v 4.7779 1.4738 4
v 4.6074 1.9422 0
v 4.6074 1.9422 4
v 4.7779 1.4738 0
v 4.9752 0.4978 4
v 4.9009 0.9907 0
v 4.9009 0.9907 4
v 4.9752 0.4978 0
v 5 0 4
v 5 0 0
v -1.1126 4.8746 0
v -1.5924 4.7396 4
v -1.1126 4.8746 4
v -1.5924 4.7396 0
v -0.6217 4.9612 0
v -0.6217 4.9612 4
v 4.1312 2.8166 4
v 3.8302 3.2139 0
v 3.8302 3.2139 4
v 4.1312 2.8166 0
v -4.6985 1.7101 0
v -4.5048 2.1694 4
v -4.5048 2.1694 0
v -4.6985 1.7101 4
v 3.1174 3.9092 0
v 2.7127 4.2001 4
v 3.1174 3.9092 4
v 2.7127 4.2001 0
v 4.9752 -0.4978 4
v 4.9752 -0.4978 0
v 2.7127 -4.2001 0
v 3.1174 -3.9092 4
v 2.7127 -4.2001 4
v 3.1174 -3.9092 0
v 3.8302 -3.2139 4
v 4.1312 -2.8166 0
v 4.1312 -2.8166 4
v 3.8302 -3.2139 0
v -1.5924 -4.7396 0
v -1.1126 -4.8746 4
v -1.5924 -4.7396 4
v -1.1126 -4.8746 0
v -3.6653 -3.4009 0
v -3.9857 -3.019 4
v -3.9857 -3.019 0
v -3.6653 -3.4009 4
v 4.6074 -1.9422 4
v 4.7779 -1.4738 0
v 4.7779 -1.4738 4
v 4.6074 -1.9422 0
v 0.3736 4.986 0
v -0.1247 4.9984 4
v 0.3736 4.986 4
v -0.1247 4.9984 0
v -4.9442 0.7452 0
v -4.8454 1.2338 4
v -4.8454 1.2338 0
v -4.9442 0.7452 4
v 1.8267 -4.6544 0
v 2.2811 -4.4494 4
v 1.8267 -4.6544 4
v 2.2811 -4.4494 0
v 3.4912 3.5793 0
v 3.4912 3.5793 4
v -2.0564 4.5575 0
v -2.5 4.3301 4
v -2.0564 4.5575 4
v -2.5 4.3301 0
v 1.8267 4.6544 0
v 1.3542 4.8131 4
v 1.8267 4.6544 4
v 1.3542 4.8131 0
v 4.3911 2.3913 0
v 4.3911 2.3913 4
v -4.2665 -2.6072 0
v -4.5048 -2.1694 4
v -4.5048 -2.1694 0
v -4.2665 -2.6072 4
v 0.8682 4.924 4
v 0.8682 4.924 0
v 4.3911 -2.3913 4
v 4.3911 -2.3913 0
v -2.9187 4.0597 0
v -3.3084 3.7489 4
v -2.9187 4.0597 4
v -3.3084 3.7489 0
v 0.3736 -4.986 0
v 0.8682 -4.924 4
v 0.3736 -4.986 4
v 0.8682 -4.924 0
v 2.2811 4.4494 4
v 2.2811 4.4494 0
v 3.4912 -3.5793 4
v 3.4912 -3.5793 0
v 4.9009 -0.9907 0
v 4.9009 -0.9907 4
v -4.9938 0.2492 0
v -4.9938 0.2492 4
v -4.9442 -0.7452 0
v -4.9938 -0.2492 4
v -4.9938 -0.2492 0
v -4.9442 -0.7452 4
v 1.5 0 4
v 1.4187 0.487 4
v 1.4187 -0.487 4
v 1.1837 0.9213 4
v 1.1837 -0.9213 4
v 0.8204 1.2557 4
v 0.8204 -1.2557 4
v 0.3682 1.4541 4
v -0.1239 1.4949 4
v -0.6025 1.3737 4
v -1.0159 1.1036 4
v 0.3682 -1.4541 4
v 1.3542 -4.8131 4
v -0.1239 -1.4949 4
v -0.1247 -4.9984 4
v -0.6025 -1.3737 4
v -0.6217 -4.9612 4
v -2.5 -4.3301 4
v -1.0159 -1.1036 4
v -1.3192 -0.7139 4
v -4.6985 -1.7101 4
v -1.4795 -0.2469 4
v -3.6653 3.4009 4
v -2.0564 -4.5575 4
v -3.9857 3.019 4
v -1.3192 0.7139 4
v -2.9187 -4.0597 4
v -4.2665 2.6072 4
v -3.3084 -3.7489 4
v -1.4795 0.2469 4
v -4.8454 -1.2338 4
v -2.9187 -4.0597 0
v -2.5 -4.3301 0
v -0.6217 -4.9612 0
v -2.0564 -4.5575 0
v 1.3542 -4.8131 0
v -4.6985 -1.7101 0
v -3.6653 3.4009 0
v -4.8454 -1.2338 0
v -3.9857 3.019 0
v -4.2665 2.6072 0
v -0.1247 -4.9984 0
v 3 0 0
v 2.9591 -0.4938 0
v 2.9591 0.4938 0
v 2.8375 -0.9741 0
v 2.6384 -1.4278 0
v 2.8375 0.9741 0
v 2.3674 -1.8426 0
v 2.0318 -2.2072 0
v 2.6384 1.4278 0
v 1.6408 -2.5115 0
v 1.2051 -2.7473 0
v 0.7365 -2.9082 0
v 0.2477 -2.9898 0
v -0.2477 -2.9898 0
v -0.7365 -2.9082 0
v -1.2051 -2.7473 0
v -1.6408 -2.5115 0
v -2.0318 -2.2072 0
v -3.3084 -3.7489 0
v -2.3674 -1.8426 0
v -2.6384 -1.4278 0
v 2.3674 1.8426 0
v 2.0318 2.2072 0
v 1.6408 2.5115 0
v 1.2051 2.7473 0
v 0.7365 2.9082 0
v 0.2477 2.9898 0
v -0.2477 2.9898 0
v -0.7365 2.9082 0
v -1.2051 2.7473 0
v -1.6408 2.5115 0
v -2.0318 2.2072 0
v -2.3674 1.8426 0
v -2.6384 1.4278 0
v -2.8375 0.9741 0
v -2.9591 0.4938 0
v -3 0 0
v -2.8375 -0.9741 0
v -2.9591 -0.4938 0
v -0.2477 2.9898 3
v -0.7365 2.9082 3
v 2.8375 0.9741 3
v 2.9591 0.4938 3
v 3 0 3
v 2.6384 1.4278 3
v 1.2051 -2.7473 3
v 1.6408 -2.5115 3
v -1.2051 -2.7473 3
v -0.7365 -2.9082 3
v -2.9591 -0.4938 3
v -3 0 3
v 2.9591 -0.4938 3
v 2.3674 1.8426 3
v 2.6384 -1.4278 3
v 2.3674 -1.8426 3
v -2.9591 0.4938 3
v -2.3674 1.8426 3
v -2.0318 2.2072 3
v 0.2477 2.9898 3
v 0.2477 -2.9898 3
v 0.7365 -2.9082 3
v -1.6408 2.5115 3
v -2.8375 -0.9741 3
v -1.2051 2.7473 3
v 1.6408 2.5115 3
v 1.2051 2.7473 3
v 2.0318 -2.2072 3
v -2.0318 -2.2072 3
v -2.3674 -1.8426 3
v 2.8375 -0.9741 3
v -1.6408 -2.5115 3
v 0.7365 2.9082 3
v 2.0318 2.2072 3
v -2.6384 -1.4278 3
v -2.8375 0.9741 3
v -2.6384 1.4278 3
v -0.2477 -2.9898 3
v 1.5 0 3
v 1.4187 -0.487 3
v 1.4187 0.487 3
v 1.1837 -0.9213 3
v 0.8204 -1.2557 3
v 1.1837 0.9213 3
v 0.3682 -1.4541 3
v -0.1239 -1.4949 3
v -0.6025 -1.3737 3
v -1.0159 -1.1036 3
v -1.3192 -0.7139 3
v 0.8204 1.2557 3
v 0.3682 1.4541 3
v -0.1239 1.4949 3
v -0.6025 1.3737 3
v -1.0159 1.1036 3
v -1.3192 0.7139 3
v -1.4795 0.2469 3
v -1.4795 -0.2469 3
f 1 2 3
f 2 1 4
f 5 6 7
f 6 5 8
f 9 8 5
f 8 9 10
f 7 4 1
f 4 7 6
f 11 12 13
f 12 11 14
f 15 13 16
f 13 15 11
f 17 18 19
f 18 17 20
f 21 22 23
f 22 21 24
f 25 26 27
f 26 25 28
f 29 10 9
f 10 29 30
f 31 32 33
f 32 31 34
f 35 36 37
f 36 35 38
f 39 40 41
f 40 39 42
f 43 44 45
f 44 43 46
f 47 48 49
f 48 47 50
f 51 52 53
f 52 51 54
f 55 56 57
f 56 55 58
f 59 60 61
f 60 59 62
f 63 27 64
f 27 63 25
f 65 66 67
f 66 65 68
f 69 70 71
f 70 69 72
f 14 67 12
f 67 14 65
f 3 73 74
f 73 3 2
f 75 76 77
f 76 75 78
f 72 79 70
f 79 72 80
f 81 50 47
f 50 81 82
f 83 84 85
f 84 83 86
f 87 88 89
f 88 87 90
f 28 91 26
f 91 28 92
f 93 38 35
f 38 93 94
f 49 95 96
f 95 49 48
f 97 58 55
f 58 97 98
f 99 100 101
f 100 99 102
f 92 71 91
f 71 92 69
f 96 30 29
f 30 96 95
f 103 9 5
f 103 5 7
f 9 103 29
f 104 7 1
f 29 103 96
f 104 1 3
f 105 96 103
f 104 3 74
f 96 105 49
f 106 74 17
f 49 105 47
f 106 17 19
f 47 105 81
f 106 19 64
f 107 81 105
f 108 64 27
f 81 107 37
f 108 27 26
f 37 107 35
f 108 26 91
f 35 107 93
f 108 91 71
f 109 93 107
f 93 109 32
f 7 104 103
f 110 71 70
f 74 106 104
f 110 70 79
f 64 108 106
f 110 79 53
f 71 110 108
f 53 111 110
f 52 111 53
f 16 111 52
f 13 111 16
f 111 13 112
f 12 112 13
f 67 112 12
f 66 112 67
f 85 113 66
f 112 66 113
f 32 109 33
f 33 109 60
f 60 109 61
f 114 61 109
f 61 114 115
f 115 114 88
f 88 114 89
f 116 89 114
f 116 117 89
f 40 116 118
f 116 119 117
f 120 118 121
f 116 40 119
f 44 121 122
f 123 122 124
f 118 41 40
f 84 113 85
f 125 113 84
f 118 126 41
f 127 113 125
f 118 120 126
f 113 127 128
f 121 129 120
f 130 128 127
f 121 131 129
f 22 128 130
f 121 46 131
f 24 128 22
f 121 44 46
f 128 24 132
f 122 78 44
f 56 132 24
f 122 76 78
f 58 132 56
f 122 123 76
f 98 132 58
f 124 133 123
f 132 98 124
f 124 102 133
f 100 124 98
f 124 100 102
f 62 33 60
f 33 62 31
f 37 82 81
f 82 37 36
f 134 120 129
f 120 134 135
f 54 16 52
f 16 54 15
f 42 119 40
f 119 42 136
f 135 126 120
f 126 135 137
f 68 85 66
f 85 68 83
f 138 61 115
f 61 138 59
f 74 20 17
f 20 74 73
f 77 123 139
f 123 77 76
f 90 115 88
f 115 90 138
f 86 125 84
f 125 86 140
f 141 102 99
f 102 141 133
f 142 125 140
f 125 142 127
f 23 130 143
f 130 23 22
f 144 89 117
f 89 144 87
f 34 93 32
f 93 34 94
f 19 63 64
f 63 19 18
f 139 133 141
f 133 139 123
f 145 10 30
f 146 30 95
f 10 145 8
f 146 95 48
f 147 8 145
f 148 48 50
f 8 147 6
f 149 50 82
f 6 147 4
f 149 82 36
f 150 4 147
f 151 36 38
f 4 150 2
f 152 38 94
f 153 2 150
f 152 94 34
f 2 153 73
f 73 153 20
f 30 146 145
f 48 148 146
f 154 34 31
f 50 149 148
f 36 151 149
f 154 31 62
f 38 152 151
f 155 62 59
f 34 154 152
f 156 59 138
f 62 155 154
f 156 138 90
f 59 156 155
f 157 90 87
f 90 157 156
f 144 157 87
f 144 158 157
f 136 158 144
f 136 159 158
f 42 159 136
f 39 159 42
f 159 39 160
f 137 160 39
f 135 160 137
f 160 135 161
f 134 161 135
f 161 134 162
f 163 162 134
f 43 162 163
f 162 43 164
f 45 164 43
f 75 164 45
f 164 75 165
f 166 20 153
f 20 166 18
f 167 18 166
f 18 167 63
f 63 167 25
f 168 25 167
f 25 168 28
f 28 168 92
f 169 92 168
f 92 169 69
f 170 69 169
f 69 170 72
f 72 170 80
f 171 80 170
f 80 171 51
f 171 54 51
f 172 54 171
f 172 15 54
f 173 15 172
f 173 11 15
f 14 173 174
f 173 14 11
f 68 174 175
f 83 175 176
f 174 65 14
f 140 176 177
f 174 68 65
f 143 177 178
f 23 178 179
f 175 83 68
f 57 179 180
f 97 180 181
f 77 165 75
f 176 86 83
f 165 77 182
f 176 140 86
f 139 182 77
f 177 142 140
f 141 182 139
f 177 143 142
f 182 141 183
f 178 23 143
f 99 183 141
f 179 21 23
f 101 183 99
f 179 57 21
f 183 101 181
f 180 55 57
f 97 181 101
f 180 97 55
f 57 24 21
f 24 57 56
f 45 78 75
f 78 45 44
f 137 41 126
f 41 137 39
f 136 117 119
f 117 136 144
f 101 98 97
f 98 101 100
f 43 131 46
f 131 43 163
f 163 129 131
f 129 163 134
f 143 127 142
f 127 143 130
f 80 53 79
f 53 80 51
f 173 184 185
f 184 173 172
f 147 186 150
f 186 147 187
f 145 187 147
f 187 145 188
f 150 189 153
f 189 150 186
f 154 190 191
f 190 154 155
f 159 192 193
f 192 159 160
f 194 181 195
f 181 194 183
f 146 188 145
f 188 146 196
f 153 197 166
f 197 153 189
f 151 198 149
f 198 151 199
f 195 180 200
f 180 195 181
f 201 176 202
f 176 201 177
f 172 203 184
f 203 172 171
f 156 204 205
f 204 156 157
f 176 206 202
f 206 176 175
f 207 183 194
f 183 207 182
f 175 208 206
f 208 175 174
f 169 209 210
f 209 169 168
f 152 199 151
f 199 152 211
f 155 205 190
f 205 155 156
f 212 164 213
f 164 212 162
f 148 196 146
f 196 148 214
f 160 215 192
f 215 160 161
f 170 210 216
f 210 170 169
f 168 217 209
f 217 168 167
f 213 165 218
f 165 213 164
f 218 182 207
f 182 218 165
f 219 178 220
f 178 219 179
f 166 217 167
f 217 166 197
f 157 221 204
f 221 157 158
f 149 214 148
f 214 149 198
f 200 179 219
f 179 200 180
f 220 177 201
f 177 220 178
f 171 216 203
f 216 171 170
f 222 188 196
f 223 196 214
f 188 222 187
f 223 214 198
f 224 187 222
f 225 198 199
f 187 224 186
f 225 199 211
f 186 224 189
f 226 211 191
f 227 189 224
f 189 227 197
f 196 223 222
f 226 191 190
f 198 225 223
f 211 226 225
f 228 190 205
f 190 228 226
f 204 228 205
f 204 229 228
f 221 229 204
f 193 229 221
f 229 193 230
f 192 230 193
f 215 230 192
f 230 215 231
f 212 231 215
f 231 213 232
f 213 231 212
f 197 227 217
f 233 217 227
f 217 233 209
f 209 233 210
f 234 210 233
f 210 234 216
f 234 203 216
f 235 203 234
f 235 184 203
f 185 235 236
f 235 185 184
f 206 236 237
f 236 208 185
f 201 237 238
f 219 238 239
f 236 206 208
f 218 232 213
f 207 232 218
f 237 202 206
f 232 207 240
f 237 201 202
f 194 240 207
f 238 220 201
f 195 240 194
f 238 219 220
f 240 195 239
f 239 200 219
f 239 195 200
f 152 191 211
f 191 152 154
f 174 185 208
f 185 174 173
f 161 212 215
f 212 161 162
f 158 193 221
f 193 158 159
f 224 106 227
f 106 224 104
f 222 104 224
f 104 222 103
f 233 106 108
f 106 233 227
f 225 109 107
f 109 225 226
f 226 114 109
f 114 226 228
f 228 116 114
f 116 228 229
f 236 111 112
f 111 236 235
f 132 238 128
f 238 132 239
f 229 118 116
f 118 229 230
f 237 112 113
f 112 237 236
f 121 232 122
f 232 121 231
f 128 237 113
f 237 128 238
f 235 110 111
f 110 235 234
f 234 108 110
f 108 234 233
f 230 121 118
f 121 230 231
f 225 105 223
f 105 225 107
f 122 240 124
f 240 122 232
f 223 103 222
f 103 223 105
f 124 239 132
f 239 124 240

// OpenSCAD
$fs=0.5;
$fa=2.5;


module servo_bracket_1_top()
{
    difference() {
        linear_extrude(height=5, convexity=3) {
            import(file="main.dxf", layer="0");
        }
        cylinder(d=3, h=5);
        cylinder(d=5.5, h=4);
        cylinder(d=13.5, h=1);
    }
}


module servo_bracket_1_bottom()
{
    difference() {
        linear_extrude(height=5, convexity=3) {
            import(file="main.dxf", layer="0");
        }
        cylinder(d=7.5, h=5);
        cylinder(d=10.5, h=4);
    }
}


module servo_test()
{
    difference() {
        cylinder(d=10, h=4);
        cylinder(d=6, h=3);
        cylinder(d=3, h=4);
    }
}


//servo_bracket_1_top();
//servo_bracket_1_bottom();
servo_test();
